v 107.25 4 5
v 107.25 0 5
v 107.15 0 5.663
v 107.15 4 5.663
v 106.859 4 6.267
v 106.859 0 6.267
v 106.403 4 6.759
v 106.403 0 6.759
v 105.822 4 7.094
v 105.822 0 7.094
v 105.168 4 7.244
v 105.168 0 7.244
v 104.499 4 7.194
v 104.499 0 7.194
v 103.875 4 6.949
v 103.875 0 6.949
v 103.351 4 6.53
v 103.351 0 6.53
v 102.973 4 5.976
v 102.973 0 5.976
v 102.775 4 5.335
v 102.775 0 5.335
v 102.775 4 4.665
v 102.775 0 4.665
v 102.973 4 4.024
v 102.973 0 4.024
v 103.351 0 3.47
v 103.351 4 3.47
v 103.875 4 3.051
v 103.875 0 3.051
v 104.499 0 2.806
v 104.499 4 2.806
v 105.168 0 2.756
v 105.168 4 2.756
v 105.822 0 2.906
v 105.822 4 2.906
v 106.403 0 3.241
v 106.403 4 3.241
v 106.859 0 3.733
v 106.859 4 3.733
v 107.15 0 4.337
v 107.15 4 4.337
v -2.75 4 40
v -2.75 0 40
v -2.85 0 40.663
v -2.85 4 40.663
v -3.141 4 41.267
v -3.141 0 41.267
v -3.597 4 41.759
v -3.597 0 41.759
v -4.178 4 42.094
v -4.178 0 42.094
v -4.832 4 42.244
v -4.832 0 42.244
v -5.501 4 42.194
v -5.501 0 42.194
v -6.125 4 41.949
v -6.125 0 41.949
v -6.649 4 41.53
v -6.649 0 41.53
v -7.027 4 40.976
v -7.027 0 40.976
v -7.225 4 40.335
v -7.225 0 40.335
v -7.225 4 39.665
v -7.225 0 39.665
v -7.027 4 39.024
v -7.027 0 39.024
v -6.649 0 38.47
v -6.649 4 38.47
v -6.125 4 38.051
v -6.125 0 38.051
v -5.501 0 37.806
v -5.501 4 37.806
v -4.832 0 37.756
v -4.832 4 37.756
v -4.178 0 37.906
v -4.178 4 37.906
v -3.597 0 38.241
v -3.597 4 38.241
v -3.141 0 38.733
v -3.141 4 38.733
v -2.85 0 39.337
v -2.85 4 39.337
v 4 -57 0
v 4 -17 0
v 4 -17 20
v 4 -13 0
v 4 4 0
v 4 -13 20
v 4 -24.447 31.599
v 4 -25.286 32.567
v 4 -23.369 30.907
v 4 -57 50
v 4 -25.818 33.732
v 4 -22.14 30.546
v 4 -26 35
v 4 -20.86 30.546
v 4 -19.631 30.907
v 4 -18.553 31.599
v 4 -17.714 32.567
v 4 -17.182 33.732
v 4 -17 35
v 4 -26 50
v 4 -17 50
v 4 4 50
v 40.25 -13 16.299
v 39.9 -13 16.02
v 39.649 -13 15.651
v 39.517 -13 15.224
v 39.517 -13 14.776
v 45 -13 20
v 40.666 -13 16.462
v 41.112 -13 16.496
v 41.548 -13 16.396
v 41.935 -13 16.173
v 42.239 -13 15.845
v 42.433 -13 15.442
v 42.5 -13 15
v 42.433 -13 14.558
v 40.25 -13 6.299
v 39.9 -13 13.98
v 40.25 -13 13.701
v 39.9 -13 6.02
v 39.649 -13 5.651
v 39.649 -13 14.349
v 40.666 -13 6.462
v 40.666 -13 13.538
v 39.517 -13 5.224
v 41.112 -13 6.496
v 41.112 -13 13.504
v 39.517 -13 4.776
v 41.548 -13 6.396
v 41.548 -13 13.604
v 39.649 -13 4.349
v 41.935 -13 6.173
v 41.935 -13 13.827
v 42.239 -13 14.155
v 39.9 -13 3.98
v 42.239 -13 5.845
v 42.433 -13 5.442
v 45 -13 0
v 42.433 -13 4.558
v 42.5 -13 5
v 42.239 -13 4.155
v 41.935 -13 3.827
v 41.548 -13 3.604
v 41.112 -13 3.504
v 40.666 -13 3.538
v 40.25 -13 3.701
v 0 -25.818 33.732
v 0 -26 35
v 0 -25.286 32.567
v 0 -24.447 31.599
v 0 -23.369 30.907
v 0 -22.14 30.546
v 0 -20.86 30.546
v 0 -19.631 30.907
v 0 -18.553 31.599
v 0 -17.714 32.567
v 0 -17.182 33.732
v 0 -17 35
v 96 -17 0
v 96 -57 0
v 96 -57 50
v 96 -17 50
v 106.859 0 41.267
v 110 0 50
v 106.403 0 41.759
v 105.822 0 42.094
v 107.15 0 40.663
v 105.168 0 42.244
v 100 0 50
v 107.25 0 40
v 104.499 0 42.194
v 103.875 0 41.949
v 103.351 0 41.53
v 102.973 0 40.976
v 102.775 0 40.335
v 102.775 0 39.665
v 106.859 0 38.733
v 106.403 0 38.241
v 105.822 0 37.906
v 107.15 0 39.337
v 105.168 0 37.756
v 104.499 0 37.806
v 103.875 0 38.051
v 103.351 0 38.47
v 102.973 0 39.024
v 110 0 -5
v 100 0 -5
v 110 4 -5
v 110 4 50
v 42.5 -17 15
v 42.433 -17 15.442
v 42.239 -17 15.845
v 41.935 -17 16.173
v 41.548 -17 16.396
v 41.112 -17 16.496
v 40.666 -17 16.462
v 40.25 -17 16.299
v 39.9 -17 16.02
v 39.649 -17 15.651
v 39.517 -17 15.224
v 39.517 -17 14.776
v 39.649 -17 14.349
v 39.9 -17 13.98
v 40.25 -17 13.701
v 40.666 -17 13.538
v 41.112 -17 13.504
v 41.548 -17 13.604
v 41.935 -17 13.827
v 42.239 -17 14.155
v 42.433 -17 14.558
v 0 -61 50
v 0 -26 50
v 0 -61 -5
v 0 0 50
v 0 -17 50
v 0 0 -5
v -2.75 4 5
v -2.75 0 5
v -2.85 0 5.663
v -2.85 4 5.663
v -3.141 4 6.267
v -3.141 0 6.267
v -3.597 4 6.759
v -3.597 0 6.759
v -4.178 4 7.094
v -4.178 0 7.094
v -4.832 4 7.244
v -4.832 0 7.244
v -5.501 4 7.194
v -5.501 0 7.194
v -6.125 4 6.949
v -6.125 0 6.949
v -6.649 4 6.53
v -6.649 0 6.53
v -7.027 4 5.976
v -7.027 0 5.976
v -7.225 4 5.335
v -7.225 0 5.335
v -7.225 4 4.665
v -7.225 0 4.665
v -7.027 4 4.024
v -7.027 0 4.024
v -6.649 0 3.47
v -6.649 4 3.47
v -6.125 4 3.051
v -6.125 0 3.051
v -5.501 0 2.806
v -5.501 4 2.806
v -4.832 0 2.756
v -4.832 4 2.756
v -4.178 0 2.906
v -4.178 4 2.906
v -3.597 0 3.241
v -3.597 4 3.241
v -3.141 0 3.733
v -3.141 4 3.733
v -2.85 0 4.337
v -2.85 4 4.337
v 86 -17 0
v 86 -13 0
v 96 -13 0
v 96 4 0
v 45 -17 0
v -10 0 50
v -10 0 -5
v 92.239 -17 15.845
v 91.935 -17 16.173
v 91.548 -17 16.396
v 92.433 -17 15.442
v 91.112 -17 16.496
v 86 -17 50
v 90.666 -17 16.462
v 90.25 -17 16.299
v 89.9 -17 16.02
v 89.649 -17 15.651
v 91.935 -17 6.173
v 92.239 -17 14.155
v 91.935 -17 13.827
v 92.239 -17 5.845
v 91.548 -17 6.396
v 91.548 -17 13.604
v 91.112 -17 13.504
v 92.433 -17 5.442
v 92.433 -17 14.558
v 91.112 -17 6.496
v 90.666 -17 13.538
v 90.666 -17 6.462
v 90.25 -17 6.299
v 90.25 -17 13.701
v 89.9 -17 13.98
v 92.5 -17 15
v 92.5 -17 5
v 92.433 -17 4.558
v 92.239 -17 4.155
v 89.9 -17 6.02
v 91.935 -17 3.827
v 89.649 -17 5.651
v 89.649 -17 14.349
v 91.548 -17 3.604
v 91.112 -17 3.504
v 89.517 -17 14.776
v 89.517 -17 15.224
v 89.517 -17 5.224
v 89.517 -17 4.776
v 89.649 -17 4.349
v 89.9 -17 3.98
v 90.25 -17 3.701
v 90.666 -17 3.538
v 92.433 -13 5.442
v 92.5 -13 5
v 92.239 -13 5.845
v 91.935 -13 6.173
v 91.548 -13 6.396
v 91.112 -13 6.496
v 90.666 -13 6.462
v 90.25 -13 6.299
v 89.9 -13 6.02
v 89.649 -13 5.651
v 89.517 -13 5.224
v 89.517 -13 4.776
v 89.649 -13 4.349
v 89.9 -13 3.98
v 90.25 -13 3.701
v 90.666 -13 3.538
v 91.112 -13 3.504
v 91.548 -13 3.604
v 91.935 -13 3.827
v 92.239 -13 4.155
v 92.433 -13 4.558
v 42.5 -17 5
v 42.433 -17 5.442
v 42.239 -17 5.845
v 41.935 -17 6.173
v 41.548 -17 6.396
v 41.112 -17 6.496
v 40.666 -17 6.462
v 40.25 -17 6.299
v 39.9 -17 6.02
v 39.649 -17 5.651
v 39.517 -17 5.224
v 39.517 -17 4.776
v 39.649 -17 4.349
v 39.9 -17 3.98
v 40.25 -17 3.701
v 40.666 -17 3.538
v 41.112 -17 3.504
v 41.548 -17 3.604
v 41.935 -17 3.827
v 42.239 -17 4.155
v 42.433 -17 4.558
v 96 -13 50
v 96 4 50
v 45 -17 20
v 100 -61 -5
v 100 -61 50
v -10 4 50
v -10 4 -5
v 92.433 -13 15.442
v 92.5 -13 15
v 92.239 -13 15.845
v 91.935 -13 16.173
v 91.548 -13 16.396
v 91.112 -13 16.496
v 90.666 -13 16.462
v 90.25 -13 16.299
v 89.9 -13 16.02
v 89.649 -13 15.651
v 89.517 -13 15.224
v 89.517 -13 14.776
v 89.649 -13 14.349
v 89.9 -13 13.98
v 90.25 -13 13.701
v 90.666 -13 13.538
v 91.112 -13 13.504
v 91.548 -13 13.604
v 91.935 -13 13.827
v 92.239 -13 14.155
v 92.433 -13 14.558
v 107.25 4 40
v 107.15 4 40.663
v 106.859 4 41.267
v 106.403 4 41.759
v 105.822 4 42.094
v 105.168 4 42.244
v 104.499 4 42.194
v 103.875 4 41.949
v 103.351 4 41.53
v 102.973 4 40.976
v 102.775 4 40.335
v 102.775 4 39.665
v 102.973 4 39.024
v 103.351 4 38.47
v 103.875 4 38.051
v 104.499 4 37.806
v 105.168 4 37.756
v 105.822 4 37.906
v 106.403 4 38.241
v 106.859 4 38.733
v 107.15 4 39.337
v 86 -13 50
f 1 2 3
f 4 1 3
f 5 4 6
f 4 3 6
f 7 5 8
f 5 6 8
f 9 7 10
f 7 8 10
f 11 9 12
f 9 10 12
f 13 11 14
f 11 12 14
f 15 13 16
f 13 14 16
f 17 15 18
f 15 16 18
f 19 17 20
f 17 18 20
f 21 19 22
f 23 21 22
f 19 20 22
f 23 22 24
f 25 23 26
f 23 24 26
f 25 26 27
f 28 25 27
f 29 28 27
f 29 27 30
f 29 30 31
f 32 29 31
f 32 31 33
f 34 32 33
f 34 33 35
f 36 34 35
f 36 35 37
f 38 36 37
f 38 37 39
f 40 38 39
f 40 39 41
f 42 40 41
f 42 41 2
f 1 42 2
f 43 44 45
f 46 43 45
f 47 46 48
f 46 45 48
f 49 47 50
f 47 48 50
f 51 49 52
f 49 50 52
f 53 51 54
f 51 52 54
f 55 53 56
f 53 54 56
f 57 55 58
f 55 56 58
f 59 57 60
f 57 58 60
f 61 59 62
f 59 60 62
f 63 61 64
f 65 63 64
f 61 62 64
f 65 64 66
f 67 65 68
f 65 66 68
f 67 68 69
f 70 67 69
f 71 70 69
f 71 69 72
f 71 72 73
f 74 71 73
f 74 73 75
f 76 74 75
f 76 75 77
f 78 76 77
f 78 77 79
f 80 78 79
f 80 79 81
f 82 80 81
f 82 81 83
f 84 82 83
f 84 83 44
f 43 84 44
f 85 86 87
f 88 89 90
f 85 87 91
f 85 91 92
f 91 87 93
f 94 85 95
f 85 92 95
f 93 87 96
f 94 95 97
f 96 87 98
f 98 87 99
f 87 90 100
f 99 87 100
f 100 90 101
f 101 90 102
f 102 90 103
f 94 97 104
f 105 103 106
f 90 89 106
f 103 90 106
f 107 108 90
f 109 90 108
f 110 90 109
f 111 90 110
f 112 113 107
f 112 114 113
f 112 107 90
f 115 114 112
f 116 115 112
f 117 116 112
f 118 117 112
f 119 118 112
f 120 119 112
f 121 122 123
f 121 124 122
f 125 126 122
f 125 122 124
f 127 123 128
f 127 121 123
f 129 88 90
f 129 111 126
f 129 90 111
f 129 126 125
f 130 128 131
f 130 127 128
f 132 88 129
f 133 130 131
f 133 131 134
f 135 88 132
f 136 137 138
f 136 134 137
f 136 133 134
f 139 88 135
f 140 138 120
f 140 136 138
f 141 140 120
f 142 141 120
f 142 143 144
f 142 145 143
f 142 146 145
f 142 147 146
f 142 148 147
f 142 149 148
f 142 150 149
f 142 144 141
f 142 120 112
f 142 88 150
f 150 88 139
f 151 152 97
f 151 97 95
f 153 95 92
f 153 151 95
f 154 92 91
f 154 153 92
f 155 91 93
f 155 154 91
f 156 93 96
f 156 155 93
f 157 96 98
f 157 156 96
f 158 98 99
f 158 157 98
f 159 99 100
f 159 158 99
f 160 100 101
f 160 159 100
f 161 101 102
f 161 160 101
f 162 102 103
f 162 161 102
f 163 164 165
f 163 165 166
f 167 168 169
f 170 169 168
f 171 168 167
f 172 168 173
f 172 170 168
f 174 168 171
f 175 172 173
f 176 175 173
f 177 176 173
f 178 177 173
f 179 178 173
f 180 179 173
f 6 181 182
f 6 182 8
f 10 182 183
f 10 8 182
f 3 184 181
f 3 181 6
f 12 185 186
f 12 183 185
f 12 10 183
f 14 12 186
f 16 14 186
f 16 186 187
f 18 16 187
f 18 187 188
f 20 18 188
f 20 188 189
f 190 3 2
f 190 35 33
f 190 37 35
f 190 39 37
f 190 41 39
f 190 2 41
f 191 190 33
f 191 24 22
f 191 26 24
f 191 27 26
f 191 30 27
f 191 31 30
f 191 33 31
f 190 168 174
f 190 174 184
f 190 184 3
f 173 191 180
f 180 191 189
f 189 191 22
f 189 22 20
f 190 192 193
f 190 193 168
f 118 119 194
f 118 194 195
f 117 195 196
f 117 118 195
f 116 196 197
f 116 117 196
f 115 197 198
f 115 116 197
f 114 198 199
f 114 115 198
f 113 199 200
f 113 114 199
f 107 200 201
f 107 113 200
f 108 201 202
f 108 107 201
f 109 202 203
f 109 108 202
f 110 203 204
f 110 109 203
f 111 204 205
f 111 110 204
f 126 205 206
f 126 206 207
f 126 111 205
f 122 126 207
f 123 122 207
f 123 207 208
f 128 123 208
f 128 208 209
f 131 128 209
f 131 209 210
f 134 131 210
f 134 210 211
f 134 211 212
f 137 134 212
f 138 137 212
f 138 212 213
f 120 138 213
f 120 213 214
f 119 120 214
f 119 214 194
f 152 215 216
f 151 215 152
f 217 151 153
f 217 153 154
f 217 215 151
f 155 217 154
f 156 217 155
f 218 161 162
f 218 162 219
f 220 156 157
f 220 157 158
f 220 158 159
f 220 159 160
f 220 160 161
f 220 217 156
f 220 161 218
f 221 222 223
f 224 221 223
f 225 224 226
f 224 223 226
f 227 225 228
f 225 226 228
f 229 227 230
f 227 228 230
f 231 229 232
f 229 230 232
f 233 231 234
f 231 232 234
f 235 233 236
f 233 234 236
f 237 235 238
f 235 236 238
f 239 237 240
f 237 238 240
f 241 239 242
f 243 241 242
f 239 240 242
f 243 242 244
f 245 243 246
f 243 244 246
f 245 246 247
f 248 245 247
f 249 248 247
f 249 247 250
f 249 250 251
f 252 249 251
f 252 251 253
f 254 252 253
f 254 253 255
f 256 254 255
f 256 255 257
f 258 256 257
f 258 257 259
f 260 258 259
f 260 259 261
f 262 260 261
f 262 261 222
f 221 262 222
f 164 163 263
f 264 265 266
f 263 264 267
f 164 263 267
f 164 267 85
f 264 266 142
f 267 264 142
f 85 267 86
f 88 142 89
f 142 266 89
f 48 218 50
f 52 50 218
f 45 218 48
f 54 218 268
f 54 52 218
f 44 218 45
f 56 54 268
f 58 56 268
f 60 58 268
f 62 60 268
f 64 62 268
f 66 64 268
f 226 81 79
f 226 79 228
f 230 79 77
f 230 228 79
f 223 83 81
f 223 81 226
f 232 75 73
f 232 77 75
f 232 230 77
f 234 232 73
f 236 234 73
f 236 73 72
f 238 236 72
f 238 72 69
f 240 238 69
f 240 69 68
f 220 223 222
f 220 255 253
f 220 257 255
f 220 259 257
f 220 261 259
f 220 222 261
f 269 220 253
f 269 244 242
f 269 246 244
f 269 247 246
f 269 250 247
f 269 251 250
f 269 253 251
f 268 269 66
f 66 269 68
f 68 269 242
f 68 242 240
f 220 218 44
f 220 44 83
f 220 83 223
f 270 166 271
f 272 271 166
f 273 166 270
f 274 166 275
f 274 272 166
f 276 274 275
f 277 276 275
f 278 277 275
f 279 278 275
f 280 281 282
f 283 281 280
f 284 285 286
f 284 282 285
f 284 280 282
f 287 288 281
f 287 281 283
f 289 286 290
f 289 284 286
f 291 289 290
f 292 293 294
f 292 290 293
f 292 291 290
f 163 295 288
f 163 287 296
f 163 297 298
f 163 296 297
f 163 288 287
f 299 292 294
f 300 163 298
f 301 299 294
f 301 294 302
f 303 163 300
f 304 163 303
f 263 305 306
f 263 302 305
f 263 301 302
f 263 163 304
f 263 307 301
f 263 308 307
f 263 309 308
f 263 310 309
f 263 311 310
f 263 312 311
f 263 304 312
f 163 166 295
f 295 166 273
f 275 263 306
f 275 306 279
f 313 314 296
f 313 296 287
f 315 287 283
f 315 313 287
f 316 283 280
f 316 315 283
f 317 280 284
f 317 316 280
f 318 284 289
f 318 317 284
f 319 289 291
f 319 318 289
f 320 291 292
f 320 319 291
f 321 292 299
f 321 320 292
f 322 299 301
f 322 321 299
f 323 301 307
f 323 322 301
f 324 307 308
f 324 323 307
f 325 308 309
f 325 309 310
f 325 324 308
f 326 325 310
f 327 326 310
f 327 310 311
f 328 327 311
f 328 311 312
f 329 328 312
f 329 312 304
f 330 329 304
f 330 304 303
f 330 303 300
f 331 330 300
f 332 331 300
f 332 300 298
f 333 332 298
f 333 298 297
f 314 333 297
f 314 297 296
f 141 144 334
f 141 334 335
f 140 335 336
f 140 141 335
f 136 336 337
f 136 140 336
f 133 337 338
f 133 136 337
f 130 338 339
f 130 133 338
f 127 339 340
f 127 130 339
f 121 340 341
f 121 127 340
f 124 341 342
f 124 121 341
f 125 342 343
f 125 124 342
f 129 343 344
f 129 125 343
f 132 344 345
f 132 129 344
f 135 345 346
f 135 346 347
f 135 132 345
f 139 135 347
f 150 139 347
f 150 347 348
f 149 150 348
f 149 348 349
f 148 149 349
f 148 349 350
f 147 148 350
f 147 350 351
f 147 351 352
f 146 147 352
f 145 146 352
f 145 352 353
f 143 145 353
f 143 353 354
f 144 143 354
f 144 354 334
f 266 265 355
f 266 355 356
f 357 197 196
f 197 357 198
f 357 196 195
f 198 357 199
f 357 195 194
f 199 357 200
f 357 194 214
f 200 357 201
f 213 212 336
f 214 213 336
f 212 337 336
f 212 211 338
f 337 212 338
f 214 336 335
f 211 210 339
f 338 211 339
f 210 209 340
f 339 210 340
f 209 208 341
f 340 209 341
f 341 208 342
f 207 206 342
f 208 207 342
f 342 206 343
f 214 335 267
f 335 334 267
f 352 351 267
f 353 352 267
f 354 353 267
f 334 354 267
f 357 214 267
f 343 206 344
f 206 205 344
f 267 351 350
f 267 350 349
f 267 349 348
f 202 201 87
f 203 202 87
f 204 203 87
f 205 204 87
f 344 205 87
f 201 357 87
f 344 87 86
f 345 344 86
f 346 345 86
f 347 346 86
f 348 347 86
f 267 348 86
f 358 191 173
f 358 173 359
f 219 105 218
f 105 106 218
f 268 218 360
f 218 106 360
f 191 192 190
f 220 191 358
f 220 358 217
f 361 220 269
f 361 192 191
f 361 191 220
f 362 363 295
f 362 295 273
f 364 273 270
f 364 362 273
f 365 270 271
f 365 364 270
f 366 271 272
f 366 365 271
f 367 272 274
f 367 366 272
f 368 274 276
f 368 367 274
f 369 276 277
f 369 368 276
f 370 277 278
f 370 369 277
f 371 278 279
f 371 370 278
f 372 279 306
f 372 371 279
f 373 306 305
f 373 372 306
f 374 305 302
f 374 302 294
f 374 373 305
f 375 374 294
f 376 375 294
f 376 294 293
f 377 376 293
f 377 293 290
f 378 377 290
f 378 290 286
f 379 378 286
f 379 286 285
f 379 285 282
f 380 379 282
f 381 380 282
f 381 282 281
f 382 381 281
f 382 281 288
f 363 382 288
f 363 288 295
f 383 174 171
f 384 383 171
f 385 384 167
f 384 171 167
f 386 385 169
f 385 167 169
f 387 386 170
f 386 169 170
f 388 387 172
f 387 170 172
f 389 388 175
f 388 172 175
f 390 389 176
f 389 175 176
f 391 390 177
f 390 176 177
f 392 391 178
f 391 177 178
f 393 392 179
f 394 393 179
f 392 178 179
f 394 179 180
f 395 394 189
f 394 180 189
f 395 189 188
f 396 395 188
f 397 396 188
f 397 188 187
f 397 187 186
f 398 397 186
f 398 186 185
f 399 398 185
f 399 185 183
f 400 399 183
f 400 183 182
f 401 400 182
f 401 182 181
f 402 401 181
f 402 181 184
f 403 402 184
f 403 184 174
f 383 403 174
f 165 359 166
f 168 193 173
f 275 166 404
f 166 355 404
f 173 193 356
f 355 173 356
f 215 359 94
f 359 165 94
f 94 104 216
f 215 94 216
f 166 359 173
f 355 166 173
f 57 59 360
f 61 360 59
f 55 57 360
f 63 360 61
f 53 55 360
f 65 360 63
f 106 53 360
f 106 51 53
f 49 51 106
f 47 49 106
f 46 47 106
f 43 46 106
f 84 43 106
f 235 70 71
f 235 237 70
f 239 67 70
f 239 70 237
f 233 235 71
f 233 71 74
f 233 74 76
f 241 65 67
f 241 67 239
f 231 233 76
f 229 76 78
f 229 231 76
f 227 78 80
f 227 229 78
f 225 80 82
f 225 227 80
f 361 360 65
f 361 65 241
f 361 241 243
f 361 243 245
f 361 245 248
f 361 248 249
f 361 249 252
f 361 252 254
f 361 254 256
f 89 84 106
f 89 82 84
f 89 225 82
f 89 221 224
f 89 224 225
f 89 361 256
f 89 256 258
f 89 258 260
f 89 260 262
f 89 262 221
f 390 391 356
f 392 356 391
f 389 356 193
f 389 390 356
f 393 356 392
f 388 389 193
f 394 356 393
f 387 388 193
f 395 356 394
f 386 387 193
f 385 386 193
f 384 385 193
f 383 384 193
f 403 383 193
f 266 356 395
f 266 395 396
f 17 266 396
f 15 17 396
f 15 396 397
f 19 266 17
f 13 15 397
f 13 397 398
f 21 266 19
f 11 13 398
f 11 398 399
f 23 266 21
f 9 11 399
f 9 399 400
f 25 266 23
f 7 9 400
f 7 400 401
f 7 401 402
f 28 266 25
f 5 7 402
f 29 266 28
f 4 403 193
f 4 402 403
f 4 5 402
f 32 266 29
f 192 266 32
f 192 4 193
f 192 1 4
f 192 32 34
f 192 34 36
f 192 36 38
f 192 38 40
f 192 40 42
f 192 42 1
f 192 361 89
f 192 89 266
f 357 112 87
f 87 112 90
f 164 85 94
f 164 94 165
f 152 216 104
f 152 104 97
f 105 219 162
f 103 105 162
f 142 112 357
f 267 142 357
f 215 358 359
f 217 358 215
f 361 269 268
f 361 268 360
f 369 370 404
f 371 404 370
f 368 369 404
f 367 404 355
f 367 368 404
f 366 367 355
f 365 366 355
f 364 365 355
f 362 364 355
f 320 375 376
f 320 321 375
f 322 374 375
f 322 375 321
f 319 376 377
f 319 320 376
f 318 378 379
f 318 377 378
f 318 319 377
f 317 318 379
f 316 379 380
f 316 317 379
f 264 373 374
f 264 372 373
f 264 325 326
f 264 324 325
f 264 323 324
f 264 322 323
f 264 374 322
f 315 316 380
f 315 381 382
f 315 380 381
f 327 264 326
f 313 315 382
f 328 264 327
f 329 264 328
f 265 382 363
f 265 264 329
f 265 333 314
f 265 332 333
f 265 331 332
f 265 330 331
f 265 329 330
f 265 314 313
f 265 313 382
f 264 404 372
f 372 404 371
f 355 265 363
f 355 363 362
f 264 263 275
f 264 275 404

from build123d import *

# Parameters (mm, degrees)
PAD_DEPTH       = 5
PAD001_DEPTH    = 50
POCKET_DEPTH    = 4
SKETCH003_R     = 1.5
POCKET001_DEPTH = 17
SKETCH004_R     = 2.25
HOLE_DEPTH      = 25
SKETCH008_W     = 45
SKETCH008_H     = 30
POCKET002_DEPTH = 4


with BuildPart() as part:
    # Sketch → Pad (new body)
    with BuildSketch(Plane.XY):
        Polygon((0, 0), (-10, 0), (-10, 4), (110, 4), (110, 0), (100, 0), (100, -61), (0, -61), align=None)
    extrude(amount=-PAD_DEPTH)

    # Sketch001 → Pad001 (join)
    with BuildSketch(Plane.XY):
        Polygon((0, 0), (-10, 0), (-10, 4), (4, 4), (4, -13), (45, -13), (45, -17), (4, -17), (4, -57), (96, -57), (96, -17), (86, -17), (86, -13), (96, -13), (96, 4), (110, 4), (110, 0), (100, 0), (100, -61), (0, -61), align=None)
    extrude(amount=PAD001_DEPTH)

    # Sketch002 → Pocket (cut)
    with BuildSketch(Plane.YZ):
        with BuildLine():
            Line((-26, 50), (-17, 50))
            Line((-17, 50), (-17, 35))
            ThreePointArc((-26, 35), (-21.5, 30.5), (-17, 35))
            Line((-26, 50), (-26, 35))
        make_face()
    extrude(amount=POCKET_DEPTH, mode=Mode.SUBTRACT)

    # Sketch003 → Pocket001 (cut)
    with BuildSketch(Plane.XZ):
        with Locations((41, 15)):
            Circle(SKETCH003_R)
        with Locations((41, 5)):
            Circle(SKETCH003_R)
        with Locations((91, 15)):
            Circle(SKETCH003_R)
        with Locations((91, 5)):
            Circle(SKETCH003_R)
    extrude(amount=POCKET001_DEPTH, mode=Mode.SUBTRACT)

    # Sketch004 → Hole (cut)
    with BuildSketch(Plane.XZ):
        with Locations((-5, 40)):
            Circle(SKETCH004_R)
        with Locations((-5, 5)):
            Circle(SKETCH004_R)
        with Locations((105, 40)):
            Circle(SKETCH004_R)
        with Locations((105, 5)):
            Circle(SKETCH004_R)
    extrude(amount=-HOLE_DEPTH, mode=Mode.SUBTRACT)

    # Sketch008 (on Face25 of Hole) → Pocket002 (cut)
    with BuildSketch(Plane(origin=(0, -13, 0), x_dir=(-1, 0, 0), z_dir=(0, 1, 0))):
        with Locations((-26.5, 35)):
            Rectangle(SKETCH008_W, SKETCH008_H)
    extrude(amount=-POCKET002_DEPTH, mode=Mode.SUBTRACT)


solid = part.part
